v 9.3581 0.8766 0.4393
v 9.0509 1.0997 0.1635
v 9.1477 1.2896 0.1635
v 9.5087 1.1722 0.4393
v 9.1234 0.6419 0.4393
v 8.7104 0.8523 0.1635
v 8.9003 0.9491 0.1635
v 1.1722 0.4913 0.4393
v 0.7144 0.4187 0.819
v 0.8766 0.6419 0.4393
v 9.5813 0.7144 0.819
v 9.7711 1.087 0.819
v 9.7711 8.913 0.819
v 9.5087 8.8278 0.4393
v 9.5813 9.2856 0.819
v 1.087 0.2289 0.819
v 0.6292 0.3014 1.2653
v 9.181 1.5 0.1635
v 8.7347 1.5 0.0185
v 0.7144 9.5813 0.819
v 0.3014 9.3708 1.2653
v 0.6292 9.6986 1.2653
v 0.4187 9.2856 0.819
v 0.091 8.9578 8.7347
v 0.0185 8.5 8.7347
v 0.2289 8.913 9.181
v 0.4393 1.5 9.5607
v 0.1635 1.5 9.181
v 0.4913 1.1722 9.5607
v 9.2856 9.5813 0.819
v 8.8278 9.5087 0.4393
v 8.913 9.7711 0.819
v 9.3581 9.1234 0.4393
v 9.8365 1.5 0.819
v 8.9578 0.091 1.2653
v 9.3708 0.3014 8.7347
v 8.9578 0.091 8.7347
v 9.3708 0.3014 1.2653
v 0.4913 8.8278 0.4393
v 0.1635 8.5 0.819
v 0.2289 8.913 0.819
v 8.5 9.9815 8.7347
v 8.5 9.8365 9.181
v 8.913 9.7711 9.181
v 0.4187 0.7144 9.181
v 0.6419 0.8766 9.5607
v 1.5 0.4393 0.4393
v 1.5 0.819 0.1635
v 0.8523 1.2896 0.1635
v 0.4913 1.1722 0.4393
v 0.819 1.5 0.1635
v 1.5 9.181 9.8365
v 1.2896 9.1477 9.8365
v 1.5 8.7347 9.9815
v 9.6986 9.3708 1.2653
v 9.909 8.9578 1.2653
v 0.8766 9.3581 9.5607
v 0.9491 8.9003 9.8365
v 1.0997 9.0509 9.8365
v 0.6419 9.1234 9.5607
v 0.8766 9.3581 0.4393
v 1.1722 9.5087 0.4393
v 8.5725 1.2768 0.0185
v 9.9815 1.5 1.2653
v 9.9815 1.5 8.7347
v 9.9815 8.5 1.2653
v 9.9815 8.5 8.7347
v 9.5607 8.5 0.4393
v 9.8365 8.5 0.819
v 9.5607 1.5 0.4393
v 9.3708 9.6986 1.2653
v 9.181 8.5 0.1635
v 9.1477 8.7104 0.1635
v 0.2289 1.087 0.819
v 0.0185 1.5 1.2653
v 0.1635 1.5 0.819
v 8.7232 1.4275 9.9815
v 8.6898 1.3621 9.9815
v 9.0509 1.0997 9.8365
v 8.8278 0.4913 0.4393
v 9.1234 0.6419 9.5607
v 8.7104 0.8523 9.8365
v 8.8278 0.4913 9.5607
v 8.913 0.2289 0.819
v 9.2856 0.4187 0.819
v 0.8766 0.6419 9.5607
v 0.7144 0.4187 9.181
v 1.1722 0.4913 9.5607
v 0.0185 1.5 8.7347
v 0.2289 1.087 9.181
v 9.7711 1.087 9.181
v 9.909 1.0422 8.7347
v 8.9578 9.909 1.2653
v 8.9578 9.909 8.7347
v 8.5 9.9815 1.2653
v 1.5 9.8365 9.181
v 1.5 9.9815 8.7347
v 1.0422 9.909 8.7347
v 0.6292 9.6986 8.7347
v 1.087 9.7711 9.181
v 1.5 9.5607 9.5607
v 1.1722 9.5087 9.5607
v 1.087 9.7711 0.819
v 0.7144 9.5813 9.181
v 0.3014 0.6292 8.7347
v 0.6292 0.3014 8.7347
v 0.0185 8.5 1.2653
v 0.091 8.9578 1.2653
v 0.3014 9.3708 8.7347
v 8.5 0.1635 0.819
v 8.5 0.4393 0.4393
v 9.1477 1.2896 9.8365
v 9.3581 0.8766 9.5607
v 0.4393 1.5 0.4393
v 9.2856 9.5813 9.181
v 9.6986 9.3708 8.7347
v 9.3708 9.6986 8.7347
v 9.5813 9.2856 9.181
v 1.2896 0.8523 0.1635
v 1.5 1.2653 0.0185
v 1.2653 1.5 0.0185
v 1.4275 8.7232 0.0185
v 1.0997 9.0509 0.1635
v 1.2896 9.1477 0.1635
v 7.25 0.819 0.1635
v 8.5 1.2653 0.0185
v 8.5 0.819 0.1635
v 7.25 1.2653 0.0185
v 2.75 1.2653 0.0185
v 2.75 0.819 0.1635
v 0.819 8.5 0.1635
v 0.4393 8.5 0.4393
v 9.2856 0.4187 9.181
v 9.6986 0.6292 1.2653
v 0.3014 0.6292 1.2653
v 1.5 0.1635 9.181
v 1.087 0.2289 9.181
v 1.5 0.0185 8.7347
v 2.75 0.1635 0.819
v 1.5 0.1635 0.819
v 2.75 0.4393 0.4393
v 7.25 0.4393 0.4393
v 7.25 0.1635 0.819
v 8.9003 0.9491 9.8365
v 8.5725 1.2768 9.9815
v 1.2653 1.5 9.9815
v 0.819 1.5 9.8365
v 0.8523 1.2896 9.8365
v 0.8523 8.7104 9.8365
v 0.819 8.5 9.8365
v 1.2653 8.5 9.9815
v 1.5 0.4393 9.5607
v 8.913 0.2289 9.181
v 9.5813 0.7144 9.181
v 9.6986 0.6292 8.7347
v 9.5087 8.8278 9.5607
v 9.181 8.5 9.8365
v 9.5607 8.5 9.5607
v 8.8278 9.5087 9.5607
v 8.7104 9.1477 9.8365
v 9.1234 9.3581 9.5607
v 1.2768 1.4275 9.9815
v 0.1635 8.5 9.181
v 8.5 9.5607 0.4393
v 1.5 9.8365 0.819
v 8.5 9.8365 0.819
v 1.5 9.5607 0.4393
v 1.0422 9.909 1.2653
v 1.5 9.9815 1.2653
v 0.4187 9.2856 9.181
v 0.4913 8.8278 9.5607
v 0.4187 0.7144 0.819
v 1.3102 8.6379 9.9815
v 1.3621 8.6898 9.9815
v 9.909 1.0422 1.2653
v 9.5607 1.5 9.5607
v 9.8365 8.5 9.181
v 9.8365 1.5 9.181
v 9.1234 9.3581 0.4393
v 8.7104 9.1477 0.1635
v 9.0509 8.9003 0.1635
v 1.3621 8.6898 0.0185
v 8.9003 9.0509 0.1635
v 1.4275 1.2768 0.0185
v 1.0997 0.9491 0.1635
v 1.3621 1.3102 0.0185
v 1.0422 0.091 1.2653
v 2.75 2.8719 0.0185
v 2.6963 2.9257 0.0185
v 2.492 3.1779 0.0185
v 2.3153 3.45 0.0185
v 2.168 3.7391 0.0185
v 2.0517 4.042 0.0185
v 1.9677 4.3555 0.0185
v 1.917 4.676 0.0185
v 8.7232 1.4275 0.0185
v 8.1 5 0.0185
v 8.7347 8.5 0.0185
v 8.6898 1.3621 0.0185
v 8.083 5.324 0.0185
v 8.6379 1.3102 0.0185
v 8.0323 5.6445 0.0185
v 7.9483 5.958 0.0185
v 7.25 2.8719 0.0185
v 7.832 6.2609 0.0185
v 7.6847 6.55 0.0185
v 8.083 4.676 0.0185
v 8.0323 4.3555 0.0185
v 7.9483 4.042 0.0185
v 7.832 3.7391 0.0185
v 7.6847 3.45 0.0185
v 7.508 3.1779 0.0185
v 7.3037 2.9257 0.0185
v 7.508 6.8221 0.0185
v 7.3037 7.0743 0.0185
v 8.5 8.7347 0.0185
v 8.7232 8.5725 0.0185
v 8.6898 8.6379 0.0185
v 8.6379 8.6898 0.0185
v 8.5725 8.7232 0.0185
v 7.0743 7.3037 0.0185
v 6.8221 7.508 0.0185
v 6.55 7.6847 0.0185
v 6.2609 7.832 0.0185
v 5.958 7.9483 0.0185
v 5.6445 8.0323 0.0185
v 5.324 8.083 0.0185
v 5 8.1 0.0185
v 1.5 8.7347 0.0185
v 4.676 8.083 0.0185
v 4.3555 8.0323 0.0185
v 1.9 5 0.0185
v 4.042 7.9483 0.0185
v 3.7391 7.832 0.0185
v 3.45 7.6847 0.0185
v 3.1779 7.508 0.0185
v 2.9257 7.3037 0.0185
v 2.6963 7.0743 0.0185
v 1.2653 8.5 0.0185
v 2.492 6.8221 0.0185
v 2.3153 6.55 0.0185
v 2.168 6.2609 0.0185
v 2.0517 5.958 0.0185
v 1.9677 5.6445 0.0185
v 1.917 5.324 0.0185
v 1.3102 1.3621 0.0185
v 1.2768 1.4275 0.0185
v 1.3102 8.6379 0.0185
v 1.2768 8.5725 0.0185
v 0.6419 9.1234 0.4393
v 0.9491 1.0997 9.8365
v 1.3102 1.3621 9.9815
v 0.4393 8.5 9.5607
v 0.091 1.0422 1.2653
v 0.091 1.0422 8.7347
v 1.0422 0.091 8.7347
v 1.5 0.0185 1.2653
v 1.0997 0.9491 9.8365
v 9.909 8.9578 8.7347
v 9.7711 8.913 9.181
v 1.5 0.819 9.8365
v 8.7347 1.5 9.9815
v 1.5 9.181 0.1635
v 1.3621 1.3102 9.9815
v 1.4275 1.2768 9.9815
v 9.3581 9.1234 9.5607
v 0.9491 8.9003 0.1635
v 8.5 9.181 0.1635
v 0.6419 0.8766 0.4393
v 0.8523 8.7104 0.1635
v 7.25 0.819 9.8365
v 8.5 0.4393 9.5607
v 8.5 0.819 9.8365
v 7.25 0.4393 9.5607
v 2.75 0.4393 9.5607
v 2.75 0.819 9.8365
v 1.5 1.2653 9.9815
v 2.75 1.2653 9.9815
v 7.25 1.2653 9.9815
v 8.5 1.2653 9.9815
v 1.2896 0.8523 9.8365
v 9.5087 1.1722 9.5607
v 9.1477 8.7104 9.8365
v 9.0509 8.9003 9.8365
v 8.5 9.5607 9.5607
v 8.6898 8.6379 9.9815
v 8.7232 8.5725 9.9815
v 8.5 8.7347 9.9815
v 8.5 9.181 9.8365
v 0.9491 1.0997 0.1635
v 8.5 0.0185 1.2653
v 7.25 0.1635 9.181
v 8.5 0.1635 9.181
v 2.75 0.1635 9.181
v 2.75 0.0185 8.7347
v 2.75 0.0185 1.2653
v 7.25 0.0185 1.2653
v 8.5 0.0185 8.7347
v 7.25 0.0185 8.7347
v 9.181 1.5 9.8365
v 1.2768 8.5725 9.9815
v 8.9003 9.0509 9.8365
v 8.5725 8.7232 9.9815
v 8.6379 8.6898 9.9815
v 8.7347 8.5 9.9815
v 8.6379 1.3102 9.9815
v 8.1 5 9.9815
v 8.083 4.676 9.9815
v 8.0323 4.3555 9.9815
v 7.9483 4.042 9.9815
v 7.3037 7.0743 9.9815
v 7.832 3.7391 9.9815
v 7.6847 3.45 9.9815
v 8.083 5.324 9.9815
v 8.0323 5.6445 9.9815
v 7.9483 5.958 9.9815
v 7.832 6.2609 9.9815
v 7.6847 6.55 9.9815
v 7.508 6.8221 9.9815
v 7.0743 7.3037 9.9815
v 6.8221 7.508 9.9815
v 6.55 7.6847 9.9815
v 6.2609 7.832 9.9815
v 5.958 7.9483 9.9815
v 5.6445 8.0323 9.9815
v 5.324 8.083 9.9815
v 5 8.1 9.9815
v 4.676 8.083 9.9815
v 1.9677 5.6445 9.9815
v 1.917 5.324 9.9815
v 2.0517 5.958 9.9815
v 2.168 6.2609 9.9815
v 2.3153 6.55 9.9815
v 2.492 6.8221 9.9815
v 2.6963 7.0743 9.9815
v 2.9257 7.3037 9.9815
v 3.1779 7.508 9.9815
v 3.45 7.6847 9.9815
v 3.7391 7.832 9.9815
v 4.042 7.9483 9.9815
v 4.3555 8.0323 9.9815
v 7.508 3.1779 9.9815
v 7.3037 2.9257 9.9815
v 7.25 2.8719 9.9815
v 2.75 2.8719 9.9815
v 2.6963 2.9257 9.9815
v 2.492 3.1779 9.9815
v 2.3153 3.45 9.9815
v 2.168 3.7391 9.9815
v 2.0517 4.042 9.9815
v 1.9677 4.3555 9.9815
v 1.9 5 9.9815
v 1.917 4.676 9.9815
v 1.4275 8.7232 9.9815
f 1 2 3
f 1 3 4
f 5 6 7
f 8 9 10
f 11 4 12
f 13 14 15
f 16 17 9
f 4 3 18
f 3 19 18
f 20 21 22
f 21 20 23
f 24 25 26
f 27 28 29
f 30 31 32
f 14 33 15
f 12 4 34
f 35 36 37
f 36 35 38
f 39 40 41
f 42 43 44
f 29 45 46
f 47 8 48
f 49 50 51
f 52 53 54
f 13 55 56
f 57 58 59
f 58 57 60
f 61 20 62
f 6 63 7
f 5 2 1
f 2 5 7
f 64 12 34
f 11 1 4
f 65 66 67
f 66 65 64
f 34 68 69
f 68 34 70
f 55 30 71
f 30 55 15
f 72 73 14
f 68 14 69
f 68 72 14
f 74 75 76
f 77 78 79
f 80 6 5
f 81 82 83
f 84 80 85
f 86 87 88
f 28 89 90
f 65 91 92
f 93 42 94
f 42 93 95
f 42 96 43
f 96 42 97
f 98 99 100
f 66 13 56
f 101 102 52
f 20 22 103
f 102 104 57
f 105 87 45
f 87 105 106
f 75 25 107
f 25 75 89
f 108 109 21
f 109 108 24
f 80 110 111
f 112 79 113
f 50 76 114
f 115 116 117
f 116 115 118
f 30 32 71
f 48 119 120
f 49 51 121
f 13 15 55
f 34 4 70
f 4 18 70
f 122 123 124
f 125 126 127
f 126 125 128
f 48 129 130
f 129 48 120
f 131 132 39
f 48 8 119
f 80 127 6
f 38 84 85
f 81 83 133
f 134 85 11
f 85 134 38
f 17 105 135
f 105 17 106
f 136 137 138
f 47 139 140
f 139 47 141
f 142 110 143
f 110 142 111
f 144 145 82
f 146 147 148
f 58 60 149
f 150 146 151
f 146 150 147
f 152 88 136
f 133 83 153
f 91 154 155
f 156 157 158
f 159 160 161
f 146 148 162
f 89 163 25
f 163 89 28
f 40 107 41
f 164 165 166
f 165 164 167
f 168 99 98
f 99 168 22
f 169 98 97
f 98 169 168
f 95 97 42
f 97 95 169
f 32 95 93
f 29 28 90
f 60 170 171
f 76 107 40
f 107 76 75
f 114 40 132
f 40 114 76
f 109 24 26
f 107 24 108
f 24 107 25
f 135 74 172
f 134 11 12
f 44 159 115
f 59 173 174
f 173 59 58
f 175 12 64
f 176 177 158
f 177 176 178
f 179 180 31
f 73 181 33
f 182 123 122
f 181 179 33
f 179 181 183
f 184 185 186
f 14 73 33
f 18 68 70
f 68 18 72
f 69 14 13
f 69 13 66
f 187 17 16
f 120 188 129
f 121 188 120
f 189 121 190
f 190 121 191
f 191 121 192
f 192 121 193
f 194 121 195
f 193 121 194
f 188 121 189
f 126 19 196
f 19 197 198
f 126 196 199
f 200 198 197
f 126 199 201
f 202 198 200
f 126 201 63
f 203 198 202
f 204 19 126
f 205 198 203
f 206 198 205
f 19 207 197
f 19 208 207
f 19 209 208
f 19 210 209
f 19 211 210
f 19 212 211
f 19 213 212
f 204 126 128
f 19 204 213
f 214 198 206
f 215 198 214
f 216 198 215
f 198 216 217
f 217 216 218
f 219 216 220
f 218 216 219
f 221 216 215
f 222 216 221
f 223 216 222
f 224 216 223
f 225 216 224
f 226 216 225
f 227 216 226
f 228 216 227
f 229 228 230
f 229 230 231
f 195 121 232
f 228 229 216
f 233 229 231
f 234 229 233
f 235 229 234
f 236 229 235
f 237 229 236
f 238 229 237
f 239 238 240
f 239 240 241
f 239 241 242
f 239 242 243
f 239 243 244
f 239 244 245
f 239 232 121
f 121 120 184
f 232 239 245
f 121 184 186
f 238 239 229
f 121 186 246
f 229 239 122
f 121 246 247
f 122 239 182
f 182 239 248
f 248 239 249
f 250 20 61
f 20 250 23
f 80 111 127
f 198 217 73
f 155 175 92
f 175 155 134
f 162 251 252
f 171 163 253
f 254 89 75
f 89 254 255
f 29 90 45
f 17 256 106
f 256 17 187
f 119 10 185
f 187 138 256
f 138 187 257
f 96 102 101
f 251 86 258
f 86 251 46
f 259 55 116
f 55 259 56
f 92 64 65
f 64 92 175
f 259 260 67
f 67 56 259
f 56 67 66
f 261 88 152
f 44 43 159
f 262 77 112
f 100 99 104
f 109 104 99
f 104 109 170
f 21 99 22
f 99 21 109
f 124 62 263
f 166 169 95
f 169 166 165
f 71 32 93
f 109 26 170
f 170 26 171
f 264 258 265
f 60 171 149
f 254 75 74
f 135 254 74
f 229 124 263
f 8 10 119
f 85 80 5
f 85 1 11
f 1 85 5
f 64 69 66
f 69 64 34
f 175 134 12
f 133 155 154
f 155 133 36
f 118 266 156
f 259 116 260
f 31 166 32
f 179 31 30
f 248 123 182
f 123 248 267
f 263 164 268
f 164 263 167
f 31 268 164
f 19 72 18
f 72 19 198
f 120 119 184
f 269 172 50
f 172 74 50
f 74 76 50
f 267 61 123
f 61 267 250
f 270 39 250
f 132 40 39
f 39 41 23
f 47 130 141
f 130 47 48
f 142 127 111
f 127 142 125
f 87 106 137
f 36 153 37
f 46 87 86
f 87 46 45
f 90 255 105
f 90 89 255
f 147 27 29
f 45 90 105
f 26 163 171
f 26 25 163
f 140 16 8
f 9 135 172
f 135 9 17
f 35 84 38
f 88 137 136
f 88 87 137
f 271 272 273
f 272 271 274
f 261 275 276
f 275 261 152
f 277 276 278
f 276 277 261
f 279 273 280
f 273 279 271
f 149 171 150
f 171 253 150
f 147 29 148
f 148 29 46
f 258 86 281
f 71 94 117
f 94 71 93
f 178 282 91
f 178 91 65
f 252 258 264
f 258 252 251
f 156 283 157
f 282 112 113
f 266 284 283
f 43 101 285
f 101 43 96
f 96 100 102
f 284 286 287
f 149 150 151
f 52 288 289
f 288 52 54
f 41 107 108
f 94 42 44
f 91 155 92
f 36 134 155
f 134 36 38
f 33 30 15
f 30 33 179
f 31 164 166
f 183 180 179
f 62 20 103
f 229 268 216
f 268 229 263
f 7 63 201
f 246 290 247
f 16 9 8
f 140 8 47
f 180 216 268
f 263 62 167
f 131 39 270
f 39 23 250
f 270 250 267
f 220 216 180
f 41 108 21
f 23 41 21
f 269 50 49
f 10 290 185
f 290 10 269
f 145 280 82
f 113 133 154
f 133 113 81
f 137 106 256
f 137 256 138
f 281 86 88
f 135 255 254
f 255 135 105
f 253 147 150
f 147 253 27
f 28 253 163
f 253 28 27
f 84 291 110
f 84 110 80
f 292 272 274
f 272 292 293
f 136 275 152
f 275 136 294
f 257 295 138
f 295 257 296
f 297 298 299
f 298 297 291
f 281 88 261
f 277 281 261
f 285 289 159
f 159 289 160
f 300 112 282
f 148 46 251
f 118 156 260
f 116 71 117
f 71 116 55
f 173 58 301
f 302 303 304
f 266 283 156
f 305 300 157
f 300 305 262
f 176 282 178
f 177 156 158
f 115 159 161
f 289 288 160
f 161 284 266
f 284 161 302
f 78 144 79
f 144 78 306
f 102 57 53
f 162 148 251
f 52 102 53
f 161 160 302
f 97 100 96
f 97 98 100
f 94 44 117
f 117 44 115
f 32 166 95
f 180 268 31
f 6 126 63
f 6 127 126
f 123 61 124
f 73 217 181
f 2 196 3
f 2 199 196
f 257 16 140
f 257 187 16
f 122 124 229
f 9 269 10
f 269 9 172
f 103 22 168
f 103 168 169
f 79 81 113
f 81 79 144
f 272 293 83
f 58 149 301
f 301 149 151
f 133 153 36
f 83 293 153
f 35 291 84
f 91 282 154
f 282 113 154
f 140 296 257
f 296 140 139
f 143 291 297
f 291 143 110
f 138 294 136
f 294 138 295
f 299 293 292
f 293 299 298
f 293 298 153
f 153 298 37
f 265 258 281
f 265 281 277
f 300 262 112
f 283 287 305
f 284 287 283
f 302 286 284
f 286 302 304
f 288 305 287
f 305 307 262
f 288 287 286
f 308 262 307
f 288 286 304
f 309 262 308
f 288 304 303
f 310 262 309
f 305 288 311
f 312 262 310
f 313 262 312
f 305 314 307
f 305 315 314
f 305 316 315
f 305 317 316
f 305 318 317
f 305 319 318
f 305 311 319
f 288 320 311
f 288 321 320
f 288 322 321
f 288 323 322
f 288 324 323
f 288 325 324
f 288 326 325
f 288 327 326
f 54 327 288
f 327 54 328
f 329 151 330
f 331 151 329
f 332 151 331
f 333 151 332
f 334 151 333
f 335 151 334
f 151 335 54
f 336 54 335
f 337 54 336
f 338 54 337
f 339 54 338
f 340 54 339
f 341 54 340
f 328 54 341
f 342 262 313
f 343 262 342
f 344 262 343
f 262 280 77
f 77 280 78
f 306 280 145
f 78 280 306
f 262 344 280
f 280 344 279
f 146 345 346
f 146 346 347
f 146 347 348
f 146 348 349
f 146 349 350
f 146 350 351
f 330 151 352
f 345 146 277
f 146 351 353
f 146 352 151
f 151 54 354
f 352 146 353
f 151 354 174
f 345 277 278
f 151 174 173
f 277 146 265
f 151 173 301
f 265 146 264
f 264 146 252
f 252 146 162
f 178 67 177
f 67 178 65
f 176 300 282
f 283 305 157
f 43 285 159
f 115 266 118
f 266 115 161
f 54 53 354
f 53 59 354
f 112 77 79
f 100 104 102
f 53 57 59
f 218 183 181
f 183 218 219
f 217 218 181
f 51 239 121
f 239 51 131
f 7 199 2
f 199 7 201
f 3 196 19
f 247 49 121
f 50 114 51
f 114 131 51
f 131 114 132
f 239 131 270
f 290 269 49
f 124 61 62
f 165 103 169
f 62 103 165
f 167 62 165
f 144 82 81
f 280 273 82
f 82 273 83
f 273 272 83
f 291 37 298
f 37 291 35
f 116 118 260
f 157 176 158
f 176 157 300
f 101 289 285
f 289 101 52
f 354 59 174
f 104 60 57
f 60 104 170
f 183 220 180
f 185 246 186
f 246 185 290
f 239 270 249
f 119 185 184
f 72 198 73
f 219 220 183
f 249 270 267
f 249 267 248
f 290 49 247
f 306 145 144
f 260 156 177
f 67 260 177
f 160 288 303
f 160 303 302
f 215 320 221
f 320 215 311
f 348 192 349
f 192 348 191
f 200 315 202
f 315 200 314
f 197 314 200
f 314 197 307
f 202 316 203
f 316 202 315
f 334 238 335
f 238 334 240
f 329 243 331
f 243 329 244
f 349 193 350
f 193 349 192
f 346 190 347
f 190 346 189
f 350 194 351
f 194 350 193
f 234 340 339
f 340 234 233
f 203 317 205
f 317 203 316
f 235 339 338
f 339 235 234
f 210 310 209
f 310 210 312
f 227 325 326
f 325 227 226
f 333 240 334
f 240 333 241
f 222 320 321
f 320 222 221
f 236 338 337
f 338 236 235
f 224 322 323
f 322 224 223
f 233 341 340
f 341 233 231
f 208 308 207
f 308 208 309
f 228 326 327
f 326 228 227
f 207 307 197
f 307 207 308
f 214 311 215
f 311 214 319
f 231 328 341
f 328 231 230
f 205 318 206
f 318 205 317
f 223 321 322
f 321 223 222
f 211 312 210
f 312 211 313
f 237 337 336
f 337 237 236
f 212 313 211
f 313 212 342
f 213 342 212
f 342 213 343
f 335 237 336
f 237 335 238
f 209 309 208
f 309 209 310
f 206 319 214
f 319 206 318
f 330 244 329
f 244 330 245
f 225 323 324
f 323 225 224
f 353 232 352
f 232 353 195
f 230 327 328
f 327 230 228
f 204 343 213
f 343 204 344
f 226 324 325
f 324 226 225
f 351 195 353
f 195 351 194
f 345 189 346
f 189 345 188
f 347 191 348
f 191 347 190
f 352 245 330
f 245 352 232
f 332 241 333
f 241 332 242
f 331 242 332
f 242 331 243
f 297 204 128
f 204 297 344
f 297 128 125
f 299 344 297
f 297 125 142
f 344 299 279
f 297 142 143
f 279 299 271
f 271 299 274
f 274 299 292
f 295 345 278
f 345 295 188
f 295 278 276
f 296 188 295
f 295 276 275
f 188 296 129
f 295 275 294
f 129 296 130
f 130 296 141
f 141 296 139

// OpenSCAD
// file: ../../lib/common.scad
// Common utilities for 3D print designs.
//
// Include from a model file with:
//   include <../../lib/common.scad>

// Default FDM clearance for sliding/snap fits (mm)
tolerance = 0.2;

// Rounded cube with configurable corner radius
//   size   : [x, y, z]
//   radius : corner radius (default 1mm)
module rounded_cube(size, radius = 1) {
    hull() {
        for (x = [radius, size[0] - radius])
            for (y = [radius, size[1] - radius])
                for (z = [radius, size[2] - radius])
                    translate([x, y, z])
                        sphere(r = radius, $fn = 20);
    }
}

// Cylinder sized with FDM tolerance applied. Use for through-holes that need
// a sliding fit on a known shaft.
module printable_hole(d, h, tol = tolerance) {
    cylinder(d = d + tol, h = h, $fn = 40);
}

// Teardrop hole: round at the top, pointed at the bottom. Prints horizontally
// without supports because the top of the bore self-supports at <45° overhang.
//   d : hole diameter
//   h : extrusion length
module teardrop_hole(d, h) {
    r = d / 2;
    linear_extrude(height = h)
        union() {
            circle(r = r, $fn = 40);
            polygon([[-r, 0], [r, 0], [0, r * 1.5]]);
        }
}
// main file
// Example: a simple parametric cable clip — verifies the toolchain works.
//
// Build with:
//   make build/example/example.stl
//   make build/example/example.3mf

include <../../lib/common.scad>

/* [Cable] */
cable_d   = 6;     // outer diameter of the cable to hold
opening_w = 4.5;   // gap to snap the cable through (< cable_d for grip)

/* [Body] */
wall      = 2;
height    = 10;

/* [Quality] */
$fn = 60;

module cable_clip() {
    outer_d = cable_d + 2 * wall;
    difference() {
        // Outer body — a rounded square block
        rounded_cube([outer_d, outer_d, height], radius = 1.5);
        // Cable bore in the middle
        translate([outer_d/2, outer_d/2, -0.1])
            cylinder(h = height + 0.2, d = cable_d + tolerance);
        // Snap-through opening on one side
        translate([outer_d/2 - opening_w/2, -0.1, -0.1])
            cube([opening_w, outer_d/2, height + 0.2]);
    }
}

cable_clip();
